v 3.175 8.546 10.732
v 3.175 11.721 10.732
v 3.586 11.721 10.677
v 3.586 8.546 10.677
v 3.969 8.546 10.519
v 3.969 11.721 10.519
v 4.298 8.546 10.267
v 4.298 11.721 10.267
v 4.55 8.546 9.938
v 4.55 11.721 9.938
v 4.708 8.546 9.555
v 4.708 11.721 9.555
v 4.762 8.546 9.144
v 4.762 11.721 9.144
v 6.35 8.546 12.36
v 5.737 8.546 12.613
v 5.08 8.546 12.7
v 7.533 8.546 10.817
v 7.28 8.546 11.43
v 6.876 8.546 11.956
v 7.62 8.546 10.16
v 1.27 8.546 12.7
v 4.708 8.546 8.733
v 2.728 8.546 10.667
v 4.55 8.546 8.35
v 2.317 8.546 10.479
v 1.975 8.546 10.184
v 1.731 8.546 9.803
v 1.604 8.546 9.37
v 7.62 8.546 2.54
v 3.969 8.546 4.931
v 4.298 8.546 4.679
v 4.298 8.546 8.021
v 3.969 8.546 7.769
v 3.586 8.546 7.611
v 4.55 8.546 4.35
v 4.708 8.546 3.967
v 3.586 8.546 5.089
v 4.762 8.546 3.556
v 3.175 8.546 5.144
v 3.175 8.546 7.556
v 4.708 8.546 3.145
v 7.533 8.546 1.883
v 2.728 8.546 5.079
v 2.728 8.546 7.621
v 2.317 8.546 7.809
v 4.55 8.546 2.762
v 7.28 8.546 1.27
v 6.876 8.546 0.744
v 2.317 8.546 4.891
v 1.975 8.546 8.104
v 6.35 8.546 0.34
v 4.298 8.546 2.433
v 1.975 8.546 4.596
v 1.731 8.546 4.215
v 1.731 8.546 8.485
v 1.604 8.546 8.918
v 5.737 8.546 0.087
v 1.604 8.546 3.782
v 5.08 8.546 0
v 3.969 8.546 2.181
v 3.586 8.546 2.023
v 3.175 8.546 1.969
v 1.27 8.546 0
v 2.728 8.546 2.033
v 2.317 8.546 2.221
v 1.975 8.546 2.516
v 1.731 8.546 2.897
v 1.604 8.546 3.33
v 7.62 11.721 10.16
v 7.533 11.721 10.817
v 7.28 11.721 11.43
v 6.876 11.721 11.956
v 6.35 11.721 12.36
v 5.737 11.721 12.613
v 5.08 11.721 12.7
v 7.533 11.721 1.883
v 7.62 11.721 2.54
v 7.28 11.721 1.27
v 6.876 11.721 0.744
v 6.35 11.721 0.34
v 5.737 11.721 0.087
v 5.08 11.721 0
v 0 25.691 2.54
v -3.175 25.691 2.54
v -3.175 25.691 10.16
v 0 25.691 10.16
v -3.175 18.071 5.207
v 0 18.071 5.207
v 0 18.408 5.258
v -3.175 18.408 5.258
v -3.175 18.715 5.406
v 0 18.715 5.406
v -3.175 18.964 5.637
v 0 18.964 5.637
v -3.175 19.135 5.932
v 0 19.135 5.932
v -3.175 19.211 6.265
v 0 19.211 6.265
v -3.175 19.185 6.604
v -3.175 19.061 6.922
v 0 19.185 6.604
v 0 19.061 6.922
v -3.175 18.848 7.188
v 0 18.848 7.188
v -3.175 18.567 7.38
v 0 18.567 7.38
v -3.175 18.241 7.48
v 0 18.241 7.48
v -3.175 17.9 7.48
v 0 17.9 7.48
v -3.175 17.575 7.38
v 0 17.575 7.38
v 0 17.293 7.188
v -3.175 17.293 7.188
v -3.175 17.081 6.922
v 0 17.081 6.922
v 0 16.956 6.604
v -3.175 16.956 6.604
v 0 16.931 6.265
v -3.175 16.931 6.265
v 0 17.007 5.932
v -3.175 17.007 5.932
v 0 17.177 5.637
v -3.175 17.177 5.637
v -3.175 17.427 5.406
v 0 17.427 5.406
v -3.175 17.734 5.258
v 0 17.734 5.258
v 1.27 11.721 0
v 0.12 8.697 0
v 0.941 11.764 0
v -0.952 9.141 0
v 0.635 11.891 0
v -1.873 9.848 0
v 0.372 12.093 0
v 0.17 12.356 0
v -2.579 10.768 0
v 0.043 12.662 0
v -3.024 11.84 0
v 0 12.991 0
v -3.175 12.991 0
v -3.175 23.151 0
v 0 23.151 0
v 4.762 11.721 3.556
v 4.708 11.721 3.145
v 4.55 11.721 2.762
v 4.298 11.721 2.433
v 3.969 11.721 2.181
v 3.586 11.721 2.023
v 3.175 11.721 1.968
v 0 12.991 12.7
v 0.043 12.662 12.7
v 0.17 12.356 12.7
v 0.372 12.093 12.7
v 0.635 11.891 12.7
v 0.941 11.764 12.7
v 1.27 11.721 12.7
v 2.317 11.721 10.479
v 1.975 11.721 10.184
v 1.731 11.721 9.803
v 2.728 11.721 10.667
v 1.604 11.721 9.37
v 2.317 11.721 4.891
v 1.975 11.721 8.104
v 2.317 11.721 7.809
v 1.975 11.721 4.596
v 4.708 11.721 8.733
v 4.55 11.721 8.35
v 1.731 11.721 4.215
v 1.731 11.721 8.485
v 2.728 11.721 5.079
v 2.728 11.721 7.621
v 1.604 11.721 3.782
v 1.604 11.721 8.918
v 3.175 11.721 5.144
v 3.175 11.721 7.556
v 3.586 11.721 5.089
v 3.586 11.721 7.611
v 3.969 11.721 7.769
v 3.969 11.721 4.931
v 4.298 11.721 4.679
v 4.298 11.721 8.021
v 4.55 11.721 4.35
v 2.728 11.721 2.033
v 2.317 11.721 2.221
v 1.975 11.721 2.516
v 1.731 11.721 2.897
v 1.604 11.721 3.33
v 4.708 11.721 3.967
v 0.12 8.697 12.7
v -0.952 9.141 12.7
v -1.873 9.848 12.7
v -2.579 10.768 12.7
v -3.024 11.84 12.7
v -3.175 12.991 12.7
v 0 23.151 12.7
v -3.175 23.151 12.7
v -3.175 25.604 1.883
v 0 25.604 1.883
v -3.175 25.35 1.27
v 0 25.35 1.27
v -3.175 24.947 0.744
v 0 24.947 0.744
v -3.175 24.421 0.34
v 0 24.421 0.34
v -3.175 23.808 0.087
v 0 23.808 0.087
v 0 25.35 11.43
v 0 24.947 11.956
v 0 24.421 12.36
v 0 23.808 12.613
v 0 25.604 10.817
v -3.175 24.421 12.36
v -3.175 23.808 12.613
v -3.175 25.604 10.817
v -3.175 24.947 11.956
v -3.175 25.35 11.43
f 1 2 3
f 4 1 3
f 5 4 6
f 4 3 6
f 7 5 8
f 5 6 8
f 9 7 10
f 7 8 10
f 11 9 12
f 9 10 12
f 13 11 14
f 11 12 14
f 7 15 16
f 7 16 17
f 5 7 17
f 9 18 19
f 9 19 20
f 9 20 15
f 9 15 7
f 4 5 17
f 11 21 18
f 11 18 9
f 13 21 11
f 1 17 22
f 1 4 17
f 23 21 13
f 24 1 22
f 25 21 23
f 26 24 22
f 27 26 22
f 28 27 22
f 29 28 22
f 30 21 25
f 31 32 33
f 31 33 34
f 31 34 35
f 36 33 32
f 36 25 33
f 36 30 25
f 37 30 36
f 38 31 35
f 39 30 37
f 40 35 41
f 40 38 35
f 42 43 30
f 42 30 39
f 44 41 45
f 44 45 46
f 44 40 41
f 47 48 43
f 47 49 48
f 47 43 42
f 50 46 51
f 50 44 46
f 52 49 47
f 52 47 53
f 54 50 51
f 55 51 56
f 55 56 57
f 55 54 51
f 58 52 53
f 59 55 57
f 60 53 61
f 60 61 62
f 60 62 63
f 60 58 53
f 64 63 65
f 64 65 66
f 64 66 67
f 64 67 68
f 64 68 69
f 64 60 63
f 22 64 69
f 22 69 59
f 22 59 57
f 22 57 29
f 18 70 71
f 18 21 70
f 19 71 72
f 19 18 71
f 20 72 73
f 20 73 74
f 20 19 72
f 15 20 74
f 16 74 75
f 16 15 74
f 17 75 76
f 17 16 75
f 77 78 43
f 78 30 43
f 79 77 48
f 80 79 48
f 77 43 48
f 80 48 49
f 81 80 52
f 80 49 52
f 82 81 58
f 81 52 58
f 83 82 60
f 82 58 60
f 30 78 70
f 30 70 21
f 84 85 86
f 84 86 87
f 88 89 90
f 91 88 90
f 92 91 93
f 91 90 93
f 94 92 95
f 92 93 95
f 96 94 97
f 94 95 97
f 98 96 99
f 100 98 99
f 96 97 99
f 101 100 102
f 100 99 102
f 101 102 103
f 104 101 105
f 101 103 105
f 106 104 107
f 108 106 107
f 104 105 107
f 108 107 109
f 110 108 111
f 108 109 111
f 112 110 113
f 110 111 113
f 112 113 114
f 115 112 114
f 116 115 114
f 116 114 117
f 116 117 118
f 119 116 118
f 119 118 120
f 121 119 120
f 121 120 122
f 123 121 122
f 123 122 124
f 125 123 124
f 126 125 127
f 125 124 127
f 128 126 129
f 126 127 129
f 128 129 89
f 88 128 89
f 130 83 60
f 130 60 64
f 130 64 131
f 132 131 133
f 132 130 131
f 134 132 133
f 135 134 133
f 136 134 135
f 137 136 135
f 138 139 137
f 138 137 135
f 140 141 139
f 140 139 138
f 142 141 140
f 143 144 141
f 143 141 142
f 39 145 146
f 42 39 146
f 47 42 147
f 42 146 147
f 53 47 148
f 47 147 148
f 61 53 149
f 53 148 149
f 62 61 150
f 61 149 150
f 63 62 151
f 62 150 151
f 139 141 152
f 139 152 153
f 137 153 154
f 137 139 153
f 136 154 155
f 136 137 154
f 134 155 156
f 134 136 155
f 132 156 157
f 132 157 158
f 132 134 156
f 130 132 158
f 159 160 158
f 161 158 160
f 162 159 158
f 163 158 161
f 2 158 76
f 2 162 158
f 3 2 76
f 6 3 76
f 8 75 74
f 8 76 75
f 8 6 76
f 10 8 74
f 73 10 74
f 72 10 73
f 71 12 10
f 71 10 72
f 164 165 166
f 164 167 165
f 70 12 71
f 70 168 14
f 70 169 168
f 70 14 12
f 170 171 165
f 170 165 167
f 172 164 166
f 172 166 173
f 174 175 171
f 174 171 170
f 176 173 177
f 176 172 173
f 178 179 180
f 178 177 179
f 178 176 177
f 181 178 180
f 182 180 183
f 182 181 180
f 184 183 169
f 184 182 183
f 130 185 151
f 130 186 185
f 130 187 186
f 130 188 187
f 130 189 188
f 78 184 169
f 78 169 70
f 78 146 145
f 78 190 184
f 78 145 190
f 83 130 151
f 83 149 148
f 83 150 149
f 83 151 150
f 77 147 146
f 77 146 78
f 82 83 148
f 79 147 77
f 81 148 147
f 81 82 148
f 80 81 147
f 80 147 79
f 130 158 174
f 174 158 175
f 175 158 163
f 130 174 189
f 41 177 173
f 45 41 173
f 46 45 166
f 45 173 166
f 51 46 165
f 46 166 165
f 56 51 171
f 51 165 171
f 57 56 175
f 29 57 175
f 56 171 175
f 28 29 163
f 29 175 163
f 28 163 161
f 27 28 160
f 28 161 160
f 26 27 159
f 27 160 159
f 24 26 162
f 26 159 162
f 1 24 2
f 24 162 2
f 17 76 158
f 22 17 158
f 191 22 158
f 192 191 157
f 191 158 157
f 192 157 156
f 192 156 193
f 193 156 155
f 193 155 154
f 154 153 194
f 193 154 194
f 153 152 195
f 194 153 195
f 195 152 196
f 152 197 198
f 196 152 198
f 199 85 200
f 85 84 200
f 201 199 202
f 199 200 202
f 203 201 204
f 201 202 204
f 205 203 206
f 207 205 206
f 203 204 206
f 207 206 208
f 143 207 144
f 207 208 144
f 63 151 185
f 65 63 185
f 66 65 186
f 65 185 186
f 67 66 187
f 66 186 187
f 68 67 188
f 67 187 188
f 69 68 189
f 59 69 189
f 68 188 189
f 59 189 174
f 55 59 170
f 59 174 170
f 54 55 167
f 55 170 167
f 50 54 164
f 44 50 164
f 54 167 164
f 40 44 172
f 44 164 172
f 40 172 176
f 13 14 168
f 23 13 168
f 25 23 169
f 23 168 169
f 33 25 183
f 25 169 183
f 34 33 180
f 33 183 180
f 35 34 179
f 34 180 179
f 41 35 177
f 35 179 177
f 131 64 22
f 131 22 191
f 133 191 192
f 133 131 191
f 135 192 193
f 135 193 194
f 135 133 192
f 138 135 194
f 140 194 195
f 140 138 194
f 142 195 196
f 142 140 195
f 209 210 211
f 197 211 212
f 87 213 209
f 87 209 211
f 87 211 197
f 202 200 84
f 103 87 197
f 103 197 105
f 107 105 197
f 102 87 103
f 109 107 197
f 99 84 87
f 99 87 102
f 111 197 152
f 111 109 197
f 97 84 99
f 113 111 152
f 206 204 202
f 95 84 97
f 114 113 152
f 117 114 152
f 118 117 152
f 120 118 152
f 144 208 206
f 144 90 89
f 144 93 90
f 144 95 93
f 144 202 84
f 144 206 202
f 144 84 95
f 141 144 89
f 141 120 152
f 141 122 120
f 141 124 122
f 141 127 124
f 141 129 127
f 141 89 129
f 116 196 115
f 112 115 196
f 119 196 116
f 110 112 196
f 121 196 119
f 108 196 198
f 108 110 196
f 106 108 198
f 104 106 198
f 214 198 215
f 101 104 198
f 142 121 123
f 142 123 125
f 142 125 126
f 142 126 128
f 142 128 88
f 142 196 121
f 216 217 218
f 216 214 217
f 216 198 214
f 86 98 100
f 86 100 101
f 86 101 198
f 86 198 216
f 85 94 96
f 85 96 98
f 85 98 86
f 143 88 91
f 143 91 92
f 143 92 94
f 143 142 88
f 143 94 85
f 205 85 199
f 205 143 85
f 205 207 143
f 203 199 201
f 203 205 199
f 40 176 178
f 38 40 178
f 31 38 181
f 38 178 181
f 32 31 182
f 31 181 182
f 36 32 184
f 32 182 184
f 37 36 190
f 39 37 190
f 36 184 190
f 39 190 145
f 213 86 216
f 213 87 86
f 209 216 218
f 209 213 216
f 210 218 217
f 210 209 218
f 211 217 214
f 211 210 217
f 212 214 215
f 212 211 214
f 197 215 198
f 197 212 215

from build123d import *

# Parameters (mm, degrees)
BOSS_EXTRUDE1_DEPTH = 12.7
FILLET1_R           = 2.54
SKETCH2_R           = 1.143
CUT_EXTRUDE1_DEPTH  = 3.175
CUT_EXTRUDE2_REACH  = 22.36


with BuildPart() as part:
    # Sketch1 → Boss-Extrude1 (new body)
    with BuildSketch(Plane.XY):
        with BuildLine():
            Line((0, 25.690786623), (0, 12.990786623))
            ThreePointArc((0, 12.990786623), (0.371974388, 12.092761011), (1.27, 11.720786623))
            Line((1.27, 11.720786623), (7.62, 11.720786623))
            Line((7.62, 11.720786623), (7.62, 8.545786623))
            Line((7.62, 8.545786623), (1.27, 8.545786623))
            ThreePointArc((1.27, 8.545786623), (-1.873089642, 9.847696981), (-3.175, 12.990786623))
            Line((-3.175, 12.990786623), (-3.175, 25.690786623))
            Line((-3.175, 25.690786623), (0, 25.690786623))
        make_face()
    extrude(amount=BOSS_EXTRUDE1_DEPTH)

    # Fillet1
    fillet1_edges = [part.edges().sort_by_distance(p)[0] for p in [
        (-1.5875, 25.690786623, 0),
        (7.62, 10.133286623, 12.7),
        (-1.5875, 25.690786623, 12.7),
        (7.62, 10.133286623, 0),
    ]]
    fillet(fillet1_edges, radius=FILLET1_R)

    # Sketch2 → Cut-Extrude1 (cut)
    with BuildSketch(Plane(origin=(0, 0, 0), x_dir=(0, 0, -1), z_dir=(1, 0, 0))):
        with Locations((-6.35, 18.070786623)):
            Circle(SKETCH2_R)
    extrude(amount=-CUT_EXTRUDE1_DEPTH, mode=Mode.SUBTRACT)

    # Sketch3 → Cut-Extrude2 (cut, up to next)
    with BuildSketch(Plane(origin=(0, 11.720786623, 0), x_dir=(1, 0, 0), z_dir=(0, 1, 0)), mode=Mode.PRIVATE) as cut_extrude2_sk1:
        with BuildLine():
            ThreePointArc((3.175, -7.5565), (1.5875, -9.144), (3.175, -10.7315))
            Line((3.175, -10.7315), (3.175, -7.5565))
        make_face()
    cut_extrude2_tool1 = extrude(cut_extrude2_sk1.sketch, amount=-CUT_EXTRUDE2_REACH, mode=Mode.PRIVATE) & part.part
    # Sketch3 → Cut-Extrude2 (cut, up to next)
    with BuildSketch(Plane(origin=(0, 11.720786623, 0), x_dir=(1, 0, 0), z_dir=(0, 1, 0)), mode=Mode.PRIVATE) as cut_extrude2_sk2:
        with BuildLine():
            Line((3.175, -7.5565), (3.175, -10.7315))
            ThreePointArc((3.175, -10.7315), (4.297532015, -10.266532015), (4.7625, -9.144))
            ThreePointArc((4.7625, -9.144), (4.297532015, -8.021467985), (3.175, -7.5565))
        make_face()
    cut_extrude2_tool2 = extrude(cut_extrude2_sk2.sketch, amount=-CUT_EXTRUDE2_REACH, mode=Mode.PRIVATE) & part.part
    # Sketch3 → Cut-Extrude2 (cut, up to next)
    with BuildSketch(Plane(origin=(0, 11.720786623, 0), x_dir=(1, 0, 0), z_dir=(0, 1, 0)), mode=Mode.PRIVATE) as cut_extrude2_sk3:
        with BuildLine():
            ThreePointArc((3.175, -7.5565), (1.5875, -9.144), (3.175, -10.7315))
            Line((3.175, -10.7315), (3.175, -7.5565))
        make_face()
    cut_extrude2_tool3 = extrude(cut_extrude2_sk3.sketch, amount=-CUT_EXTRUDE2_REACH, mode=Mode.PRIVATE) & part.part
    # Sketch3 → Cut-Extrude2 (cut, up to next)
    with BuildSketch(Plane(origin=(0, 11.720786623, 0), x_dir=(1, 0, 0), z_dir=(0, 1, 0)), mode=Mode.PRIVATE) as cut_extrude2_sk4:
        with BuildLine():
            Line((3.175, -7.5565), (3.175, -10.7315))
            ThreePointArc((3.175, -10.7315), (4.297532015, -10.266532015), (4.7625, -9.144))
            ThreePointArc((4.7625, -9.144), (4.297532015, -8.021467985), (3.175, -7.5565))
        make_face()
    cut_extrude2_tool4 = extrude(cut_extrude2_sk4.sketch, amount=-CUT_EXTRUDE2_REACH, mode=Mode.PRIVATE) & part.part
    # Sketch3 → Cut-Extrude2 (cut, up to next)
    with BuildSketch(Plane(origin=(0, 11.720786623, 0), x_dir=(1, 0, 0), z_dir=(0, 1, 0)), mode=Mode.PRIVATE) as cut_extrude2_sk5:
        with BuildLine():
            ThreePointArc((3.175, -1.9685), (1.5875, -3.556), (3.175, -5.1435))
            Line((3.175, -5.1435), (3.175, -1.9685))
        make_face()
    cut_extrude2_tool5 = extrude(cut_extrude2_sk5.sketch, amount=-CUT_EXTRUDE2_REACH, mode=Mode.PRIVATE) & part.part
    # Sketch3 → Cut-Extrude2 (cut, up to next)
    with BuildSketch(Plane(origin=(0, 11.720786623, 0), x_dir=(1, 0, 0), z_dir=(0, 1, 0)), mode=Mode.PRIVATE) as cut_extrude2_sk6:
        with BuildLine():
            Line((3.175, -1.9685), (3.175, -5.1435))
            ThreePointArc((3.175, -5.1435), (4.297532015, -4.678532015), (4.7625, -3.556))
            ThreePointArc((4.7625, -3.556), (4.297532015, -2.433467985), (3.175, -1.9685))
        make_face()
    cut_extrude2_tool6 = extrude(cut_extrude2_sk6.sketch, amount=-CUT_EXTRUDE2_REACH, mode=Mode.PRIVATE) & part.part
    # Sketch3 → Cut-Extrude2 (cut, up to next)
    with BuildSketch(Plane(origin=(0, 11.720786623, 0), x_dir=(1, 0, 0), z_dir=(0, 1, 0)), mode=Mode.PRIVATE) as cut_extrude2_sk7:
        with BuildLine():
            ThreePointArc((3.175, -1.9685), (1.5875, -3.556), (3.175, -5.1435))
            Line((3.175, -5.1435), (3.175, -1.9685))
        make_face()
    cut_extrude2_tool7 = extrude(cut_extrude2_sk7.sketch, amount=-CUT_EXTRUDE2_REACH, mode=Mode.PRIVATE) & part.part
    # Sketch3 → Cut-Extrude2 (cut, up to next)
    with BuildSketch(Plane(origin=(0, 11.720786623, 0), x_dir=(1, 0, 0), z_dir=(0, 1, 0)), mode=Mode.PRIVATE) as cut_extrude2_sk8:
        with BuildLine():
            Line((3.175, -1.9685), (3.175, -5.1435))
            ThreePointArc((3.175, -5.1435), (4.297532015, -4.678532015), (4.7625, -3.556))
            ThreePointArc((4.7625, -3.556), (4.297532015, -2.433467985), (3.175, -1.9685))
        make_face()
    cut_extrude2_tool8 = extrude(cut_extrude2_sk8.sketch, amount=-CUT_EXTRUDE2_REACH, mode=Mode.PRIVATE) & part.part
    add(cut_extrude2_tool1.solids().sort_by_distance((2.501244, 11.720787, 9.144))[0], mode=Mode.SUBTRACT)
    add(cut_extrude2_tool2.solids().sort_by_distance((3.848756, 11.720787, 9.144))[0], mode=Mode.SUBTRACT)
    add(cut_extrude2_tool3.solids().sort_by_distance((2.501244, 11.720787, 9.144))[0], mode=Mode.SUBTRACT)
    add(cut_extrude2_tool4.solids().sort_by_distance((3.848756, 11.720787, 9.144))[0], mode=Mode.SUBTRACT)
    add(cut_extrude2_tool5.solids().sort_by_distance((2.501244, 11.720787, 3.556))[0], mode=Mode.SUBTRACT)
    add(cut_extrude2_tool6.solids().sort_by_distance((3.848756, 11.720787, 3.556))[0], mode=Mode.SUBTRACT)
    add(cut_extrude2_tool7.solids().sort_by_distance((2.501244, 11.720787, 3.556))[0], mode=Mode.SUBTRACT)
    add(cut_extrude2_tool8.solids().sort_by_distance((3.848756, 11.720787, 3.556))[0], mode=Mode.SUBTRACT)


solid = part.part
